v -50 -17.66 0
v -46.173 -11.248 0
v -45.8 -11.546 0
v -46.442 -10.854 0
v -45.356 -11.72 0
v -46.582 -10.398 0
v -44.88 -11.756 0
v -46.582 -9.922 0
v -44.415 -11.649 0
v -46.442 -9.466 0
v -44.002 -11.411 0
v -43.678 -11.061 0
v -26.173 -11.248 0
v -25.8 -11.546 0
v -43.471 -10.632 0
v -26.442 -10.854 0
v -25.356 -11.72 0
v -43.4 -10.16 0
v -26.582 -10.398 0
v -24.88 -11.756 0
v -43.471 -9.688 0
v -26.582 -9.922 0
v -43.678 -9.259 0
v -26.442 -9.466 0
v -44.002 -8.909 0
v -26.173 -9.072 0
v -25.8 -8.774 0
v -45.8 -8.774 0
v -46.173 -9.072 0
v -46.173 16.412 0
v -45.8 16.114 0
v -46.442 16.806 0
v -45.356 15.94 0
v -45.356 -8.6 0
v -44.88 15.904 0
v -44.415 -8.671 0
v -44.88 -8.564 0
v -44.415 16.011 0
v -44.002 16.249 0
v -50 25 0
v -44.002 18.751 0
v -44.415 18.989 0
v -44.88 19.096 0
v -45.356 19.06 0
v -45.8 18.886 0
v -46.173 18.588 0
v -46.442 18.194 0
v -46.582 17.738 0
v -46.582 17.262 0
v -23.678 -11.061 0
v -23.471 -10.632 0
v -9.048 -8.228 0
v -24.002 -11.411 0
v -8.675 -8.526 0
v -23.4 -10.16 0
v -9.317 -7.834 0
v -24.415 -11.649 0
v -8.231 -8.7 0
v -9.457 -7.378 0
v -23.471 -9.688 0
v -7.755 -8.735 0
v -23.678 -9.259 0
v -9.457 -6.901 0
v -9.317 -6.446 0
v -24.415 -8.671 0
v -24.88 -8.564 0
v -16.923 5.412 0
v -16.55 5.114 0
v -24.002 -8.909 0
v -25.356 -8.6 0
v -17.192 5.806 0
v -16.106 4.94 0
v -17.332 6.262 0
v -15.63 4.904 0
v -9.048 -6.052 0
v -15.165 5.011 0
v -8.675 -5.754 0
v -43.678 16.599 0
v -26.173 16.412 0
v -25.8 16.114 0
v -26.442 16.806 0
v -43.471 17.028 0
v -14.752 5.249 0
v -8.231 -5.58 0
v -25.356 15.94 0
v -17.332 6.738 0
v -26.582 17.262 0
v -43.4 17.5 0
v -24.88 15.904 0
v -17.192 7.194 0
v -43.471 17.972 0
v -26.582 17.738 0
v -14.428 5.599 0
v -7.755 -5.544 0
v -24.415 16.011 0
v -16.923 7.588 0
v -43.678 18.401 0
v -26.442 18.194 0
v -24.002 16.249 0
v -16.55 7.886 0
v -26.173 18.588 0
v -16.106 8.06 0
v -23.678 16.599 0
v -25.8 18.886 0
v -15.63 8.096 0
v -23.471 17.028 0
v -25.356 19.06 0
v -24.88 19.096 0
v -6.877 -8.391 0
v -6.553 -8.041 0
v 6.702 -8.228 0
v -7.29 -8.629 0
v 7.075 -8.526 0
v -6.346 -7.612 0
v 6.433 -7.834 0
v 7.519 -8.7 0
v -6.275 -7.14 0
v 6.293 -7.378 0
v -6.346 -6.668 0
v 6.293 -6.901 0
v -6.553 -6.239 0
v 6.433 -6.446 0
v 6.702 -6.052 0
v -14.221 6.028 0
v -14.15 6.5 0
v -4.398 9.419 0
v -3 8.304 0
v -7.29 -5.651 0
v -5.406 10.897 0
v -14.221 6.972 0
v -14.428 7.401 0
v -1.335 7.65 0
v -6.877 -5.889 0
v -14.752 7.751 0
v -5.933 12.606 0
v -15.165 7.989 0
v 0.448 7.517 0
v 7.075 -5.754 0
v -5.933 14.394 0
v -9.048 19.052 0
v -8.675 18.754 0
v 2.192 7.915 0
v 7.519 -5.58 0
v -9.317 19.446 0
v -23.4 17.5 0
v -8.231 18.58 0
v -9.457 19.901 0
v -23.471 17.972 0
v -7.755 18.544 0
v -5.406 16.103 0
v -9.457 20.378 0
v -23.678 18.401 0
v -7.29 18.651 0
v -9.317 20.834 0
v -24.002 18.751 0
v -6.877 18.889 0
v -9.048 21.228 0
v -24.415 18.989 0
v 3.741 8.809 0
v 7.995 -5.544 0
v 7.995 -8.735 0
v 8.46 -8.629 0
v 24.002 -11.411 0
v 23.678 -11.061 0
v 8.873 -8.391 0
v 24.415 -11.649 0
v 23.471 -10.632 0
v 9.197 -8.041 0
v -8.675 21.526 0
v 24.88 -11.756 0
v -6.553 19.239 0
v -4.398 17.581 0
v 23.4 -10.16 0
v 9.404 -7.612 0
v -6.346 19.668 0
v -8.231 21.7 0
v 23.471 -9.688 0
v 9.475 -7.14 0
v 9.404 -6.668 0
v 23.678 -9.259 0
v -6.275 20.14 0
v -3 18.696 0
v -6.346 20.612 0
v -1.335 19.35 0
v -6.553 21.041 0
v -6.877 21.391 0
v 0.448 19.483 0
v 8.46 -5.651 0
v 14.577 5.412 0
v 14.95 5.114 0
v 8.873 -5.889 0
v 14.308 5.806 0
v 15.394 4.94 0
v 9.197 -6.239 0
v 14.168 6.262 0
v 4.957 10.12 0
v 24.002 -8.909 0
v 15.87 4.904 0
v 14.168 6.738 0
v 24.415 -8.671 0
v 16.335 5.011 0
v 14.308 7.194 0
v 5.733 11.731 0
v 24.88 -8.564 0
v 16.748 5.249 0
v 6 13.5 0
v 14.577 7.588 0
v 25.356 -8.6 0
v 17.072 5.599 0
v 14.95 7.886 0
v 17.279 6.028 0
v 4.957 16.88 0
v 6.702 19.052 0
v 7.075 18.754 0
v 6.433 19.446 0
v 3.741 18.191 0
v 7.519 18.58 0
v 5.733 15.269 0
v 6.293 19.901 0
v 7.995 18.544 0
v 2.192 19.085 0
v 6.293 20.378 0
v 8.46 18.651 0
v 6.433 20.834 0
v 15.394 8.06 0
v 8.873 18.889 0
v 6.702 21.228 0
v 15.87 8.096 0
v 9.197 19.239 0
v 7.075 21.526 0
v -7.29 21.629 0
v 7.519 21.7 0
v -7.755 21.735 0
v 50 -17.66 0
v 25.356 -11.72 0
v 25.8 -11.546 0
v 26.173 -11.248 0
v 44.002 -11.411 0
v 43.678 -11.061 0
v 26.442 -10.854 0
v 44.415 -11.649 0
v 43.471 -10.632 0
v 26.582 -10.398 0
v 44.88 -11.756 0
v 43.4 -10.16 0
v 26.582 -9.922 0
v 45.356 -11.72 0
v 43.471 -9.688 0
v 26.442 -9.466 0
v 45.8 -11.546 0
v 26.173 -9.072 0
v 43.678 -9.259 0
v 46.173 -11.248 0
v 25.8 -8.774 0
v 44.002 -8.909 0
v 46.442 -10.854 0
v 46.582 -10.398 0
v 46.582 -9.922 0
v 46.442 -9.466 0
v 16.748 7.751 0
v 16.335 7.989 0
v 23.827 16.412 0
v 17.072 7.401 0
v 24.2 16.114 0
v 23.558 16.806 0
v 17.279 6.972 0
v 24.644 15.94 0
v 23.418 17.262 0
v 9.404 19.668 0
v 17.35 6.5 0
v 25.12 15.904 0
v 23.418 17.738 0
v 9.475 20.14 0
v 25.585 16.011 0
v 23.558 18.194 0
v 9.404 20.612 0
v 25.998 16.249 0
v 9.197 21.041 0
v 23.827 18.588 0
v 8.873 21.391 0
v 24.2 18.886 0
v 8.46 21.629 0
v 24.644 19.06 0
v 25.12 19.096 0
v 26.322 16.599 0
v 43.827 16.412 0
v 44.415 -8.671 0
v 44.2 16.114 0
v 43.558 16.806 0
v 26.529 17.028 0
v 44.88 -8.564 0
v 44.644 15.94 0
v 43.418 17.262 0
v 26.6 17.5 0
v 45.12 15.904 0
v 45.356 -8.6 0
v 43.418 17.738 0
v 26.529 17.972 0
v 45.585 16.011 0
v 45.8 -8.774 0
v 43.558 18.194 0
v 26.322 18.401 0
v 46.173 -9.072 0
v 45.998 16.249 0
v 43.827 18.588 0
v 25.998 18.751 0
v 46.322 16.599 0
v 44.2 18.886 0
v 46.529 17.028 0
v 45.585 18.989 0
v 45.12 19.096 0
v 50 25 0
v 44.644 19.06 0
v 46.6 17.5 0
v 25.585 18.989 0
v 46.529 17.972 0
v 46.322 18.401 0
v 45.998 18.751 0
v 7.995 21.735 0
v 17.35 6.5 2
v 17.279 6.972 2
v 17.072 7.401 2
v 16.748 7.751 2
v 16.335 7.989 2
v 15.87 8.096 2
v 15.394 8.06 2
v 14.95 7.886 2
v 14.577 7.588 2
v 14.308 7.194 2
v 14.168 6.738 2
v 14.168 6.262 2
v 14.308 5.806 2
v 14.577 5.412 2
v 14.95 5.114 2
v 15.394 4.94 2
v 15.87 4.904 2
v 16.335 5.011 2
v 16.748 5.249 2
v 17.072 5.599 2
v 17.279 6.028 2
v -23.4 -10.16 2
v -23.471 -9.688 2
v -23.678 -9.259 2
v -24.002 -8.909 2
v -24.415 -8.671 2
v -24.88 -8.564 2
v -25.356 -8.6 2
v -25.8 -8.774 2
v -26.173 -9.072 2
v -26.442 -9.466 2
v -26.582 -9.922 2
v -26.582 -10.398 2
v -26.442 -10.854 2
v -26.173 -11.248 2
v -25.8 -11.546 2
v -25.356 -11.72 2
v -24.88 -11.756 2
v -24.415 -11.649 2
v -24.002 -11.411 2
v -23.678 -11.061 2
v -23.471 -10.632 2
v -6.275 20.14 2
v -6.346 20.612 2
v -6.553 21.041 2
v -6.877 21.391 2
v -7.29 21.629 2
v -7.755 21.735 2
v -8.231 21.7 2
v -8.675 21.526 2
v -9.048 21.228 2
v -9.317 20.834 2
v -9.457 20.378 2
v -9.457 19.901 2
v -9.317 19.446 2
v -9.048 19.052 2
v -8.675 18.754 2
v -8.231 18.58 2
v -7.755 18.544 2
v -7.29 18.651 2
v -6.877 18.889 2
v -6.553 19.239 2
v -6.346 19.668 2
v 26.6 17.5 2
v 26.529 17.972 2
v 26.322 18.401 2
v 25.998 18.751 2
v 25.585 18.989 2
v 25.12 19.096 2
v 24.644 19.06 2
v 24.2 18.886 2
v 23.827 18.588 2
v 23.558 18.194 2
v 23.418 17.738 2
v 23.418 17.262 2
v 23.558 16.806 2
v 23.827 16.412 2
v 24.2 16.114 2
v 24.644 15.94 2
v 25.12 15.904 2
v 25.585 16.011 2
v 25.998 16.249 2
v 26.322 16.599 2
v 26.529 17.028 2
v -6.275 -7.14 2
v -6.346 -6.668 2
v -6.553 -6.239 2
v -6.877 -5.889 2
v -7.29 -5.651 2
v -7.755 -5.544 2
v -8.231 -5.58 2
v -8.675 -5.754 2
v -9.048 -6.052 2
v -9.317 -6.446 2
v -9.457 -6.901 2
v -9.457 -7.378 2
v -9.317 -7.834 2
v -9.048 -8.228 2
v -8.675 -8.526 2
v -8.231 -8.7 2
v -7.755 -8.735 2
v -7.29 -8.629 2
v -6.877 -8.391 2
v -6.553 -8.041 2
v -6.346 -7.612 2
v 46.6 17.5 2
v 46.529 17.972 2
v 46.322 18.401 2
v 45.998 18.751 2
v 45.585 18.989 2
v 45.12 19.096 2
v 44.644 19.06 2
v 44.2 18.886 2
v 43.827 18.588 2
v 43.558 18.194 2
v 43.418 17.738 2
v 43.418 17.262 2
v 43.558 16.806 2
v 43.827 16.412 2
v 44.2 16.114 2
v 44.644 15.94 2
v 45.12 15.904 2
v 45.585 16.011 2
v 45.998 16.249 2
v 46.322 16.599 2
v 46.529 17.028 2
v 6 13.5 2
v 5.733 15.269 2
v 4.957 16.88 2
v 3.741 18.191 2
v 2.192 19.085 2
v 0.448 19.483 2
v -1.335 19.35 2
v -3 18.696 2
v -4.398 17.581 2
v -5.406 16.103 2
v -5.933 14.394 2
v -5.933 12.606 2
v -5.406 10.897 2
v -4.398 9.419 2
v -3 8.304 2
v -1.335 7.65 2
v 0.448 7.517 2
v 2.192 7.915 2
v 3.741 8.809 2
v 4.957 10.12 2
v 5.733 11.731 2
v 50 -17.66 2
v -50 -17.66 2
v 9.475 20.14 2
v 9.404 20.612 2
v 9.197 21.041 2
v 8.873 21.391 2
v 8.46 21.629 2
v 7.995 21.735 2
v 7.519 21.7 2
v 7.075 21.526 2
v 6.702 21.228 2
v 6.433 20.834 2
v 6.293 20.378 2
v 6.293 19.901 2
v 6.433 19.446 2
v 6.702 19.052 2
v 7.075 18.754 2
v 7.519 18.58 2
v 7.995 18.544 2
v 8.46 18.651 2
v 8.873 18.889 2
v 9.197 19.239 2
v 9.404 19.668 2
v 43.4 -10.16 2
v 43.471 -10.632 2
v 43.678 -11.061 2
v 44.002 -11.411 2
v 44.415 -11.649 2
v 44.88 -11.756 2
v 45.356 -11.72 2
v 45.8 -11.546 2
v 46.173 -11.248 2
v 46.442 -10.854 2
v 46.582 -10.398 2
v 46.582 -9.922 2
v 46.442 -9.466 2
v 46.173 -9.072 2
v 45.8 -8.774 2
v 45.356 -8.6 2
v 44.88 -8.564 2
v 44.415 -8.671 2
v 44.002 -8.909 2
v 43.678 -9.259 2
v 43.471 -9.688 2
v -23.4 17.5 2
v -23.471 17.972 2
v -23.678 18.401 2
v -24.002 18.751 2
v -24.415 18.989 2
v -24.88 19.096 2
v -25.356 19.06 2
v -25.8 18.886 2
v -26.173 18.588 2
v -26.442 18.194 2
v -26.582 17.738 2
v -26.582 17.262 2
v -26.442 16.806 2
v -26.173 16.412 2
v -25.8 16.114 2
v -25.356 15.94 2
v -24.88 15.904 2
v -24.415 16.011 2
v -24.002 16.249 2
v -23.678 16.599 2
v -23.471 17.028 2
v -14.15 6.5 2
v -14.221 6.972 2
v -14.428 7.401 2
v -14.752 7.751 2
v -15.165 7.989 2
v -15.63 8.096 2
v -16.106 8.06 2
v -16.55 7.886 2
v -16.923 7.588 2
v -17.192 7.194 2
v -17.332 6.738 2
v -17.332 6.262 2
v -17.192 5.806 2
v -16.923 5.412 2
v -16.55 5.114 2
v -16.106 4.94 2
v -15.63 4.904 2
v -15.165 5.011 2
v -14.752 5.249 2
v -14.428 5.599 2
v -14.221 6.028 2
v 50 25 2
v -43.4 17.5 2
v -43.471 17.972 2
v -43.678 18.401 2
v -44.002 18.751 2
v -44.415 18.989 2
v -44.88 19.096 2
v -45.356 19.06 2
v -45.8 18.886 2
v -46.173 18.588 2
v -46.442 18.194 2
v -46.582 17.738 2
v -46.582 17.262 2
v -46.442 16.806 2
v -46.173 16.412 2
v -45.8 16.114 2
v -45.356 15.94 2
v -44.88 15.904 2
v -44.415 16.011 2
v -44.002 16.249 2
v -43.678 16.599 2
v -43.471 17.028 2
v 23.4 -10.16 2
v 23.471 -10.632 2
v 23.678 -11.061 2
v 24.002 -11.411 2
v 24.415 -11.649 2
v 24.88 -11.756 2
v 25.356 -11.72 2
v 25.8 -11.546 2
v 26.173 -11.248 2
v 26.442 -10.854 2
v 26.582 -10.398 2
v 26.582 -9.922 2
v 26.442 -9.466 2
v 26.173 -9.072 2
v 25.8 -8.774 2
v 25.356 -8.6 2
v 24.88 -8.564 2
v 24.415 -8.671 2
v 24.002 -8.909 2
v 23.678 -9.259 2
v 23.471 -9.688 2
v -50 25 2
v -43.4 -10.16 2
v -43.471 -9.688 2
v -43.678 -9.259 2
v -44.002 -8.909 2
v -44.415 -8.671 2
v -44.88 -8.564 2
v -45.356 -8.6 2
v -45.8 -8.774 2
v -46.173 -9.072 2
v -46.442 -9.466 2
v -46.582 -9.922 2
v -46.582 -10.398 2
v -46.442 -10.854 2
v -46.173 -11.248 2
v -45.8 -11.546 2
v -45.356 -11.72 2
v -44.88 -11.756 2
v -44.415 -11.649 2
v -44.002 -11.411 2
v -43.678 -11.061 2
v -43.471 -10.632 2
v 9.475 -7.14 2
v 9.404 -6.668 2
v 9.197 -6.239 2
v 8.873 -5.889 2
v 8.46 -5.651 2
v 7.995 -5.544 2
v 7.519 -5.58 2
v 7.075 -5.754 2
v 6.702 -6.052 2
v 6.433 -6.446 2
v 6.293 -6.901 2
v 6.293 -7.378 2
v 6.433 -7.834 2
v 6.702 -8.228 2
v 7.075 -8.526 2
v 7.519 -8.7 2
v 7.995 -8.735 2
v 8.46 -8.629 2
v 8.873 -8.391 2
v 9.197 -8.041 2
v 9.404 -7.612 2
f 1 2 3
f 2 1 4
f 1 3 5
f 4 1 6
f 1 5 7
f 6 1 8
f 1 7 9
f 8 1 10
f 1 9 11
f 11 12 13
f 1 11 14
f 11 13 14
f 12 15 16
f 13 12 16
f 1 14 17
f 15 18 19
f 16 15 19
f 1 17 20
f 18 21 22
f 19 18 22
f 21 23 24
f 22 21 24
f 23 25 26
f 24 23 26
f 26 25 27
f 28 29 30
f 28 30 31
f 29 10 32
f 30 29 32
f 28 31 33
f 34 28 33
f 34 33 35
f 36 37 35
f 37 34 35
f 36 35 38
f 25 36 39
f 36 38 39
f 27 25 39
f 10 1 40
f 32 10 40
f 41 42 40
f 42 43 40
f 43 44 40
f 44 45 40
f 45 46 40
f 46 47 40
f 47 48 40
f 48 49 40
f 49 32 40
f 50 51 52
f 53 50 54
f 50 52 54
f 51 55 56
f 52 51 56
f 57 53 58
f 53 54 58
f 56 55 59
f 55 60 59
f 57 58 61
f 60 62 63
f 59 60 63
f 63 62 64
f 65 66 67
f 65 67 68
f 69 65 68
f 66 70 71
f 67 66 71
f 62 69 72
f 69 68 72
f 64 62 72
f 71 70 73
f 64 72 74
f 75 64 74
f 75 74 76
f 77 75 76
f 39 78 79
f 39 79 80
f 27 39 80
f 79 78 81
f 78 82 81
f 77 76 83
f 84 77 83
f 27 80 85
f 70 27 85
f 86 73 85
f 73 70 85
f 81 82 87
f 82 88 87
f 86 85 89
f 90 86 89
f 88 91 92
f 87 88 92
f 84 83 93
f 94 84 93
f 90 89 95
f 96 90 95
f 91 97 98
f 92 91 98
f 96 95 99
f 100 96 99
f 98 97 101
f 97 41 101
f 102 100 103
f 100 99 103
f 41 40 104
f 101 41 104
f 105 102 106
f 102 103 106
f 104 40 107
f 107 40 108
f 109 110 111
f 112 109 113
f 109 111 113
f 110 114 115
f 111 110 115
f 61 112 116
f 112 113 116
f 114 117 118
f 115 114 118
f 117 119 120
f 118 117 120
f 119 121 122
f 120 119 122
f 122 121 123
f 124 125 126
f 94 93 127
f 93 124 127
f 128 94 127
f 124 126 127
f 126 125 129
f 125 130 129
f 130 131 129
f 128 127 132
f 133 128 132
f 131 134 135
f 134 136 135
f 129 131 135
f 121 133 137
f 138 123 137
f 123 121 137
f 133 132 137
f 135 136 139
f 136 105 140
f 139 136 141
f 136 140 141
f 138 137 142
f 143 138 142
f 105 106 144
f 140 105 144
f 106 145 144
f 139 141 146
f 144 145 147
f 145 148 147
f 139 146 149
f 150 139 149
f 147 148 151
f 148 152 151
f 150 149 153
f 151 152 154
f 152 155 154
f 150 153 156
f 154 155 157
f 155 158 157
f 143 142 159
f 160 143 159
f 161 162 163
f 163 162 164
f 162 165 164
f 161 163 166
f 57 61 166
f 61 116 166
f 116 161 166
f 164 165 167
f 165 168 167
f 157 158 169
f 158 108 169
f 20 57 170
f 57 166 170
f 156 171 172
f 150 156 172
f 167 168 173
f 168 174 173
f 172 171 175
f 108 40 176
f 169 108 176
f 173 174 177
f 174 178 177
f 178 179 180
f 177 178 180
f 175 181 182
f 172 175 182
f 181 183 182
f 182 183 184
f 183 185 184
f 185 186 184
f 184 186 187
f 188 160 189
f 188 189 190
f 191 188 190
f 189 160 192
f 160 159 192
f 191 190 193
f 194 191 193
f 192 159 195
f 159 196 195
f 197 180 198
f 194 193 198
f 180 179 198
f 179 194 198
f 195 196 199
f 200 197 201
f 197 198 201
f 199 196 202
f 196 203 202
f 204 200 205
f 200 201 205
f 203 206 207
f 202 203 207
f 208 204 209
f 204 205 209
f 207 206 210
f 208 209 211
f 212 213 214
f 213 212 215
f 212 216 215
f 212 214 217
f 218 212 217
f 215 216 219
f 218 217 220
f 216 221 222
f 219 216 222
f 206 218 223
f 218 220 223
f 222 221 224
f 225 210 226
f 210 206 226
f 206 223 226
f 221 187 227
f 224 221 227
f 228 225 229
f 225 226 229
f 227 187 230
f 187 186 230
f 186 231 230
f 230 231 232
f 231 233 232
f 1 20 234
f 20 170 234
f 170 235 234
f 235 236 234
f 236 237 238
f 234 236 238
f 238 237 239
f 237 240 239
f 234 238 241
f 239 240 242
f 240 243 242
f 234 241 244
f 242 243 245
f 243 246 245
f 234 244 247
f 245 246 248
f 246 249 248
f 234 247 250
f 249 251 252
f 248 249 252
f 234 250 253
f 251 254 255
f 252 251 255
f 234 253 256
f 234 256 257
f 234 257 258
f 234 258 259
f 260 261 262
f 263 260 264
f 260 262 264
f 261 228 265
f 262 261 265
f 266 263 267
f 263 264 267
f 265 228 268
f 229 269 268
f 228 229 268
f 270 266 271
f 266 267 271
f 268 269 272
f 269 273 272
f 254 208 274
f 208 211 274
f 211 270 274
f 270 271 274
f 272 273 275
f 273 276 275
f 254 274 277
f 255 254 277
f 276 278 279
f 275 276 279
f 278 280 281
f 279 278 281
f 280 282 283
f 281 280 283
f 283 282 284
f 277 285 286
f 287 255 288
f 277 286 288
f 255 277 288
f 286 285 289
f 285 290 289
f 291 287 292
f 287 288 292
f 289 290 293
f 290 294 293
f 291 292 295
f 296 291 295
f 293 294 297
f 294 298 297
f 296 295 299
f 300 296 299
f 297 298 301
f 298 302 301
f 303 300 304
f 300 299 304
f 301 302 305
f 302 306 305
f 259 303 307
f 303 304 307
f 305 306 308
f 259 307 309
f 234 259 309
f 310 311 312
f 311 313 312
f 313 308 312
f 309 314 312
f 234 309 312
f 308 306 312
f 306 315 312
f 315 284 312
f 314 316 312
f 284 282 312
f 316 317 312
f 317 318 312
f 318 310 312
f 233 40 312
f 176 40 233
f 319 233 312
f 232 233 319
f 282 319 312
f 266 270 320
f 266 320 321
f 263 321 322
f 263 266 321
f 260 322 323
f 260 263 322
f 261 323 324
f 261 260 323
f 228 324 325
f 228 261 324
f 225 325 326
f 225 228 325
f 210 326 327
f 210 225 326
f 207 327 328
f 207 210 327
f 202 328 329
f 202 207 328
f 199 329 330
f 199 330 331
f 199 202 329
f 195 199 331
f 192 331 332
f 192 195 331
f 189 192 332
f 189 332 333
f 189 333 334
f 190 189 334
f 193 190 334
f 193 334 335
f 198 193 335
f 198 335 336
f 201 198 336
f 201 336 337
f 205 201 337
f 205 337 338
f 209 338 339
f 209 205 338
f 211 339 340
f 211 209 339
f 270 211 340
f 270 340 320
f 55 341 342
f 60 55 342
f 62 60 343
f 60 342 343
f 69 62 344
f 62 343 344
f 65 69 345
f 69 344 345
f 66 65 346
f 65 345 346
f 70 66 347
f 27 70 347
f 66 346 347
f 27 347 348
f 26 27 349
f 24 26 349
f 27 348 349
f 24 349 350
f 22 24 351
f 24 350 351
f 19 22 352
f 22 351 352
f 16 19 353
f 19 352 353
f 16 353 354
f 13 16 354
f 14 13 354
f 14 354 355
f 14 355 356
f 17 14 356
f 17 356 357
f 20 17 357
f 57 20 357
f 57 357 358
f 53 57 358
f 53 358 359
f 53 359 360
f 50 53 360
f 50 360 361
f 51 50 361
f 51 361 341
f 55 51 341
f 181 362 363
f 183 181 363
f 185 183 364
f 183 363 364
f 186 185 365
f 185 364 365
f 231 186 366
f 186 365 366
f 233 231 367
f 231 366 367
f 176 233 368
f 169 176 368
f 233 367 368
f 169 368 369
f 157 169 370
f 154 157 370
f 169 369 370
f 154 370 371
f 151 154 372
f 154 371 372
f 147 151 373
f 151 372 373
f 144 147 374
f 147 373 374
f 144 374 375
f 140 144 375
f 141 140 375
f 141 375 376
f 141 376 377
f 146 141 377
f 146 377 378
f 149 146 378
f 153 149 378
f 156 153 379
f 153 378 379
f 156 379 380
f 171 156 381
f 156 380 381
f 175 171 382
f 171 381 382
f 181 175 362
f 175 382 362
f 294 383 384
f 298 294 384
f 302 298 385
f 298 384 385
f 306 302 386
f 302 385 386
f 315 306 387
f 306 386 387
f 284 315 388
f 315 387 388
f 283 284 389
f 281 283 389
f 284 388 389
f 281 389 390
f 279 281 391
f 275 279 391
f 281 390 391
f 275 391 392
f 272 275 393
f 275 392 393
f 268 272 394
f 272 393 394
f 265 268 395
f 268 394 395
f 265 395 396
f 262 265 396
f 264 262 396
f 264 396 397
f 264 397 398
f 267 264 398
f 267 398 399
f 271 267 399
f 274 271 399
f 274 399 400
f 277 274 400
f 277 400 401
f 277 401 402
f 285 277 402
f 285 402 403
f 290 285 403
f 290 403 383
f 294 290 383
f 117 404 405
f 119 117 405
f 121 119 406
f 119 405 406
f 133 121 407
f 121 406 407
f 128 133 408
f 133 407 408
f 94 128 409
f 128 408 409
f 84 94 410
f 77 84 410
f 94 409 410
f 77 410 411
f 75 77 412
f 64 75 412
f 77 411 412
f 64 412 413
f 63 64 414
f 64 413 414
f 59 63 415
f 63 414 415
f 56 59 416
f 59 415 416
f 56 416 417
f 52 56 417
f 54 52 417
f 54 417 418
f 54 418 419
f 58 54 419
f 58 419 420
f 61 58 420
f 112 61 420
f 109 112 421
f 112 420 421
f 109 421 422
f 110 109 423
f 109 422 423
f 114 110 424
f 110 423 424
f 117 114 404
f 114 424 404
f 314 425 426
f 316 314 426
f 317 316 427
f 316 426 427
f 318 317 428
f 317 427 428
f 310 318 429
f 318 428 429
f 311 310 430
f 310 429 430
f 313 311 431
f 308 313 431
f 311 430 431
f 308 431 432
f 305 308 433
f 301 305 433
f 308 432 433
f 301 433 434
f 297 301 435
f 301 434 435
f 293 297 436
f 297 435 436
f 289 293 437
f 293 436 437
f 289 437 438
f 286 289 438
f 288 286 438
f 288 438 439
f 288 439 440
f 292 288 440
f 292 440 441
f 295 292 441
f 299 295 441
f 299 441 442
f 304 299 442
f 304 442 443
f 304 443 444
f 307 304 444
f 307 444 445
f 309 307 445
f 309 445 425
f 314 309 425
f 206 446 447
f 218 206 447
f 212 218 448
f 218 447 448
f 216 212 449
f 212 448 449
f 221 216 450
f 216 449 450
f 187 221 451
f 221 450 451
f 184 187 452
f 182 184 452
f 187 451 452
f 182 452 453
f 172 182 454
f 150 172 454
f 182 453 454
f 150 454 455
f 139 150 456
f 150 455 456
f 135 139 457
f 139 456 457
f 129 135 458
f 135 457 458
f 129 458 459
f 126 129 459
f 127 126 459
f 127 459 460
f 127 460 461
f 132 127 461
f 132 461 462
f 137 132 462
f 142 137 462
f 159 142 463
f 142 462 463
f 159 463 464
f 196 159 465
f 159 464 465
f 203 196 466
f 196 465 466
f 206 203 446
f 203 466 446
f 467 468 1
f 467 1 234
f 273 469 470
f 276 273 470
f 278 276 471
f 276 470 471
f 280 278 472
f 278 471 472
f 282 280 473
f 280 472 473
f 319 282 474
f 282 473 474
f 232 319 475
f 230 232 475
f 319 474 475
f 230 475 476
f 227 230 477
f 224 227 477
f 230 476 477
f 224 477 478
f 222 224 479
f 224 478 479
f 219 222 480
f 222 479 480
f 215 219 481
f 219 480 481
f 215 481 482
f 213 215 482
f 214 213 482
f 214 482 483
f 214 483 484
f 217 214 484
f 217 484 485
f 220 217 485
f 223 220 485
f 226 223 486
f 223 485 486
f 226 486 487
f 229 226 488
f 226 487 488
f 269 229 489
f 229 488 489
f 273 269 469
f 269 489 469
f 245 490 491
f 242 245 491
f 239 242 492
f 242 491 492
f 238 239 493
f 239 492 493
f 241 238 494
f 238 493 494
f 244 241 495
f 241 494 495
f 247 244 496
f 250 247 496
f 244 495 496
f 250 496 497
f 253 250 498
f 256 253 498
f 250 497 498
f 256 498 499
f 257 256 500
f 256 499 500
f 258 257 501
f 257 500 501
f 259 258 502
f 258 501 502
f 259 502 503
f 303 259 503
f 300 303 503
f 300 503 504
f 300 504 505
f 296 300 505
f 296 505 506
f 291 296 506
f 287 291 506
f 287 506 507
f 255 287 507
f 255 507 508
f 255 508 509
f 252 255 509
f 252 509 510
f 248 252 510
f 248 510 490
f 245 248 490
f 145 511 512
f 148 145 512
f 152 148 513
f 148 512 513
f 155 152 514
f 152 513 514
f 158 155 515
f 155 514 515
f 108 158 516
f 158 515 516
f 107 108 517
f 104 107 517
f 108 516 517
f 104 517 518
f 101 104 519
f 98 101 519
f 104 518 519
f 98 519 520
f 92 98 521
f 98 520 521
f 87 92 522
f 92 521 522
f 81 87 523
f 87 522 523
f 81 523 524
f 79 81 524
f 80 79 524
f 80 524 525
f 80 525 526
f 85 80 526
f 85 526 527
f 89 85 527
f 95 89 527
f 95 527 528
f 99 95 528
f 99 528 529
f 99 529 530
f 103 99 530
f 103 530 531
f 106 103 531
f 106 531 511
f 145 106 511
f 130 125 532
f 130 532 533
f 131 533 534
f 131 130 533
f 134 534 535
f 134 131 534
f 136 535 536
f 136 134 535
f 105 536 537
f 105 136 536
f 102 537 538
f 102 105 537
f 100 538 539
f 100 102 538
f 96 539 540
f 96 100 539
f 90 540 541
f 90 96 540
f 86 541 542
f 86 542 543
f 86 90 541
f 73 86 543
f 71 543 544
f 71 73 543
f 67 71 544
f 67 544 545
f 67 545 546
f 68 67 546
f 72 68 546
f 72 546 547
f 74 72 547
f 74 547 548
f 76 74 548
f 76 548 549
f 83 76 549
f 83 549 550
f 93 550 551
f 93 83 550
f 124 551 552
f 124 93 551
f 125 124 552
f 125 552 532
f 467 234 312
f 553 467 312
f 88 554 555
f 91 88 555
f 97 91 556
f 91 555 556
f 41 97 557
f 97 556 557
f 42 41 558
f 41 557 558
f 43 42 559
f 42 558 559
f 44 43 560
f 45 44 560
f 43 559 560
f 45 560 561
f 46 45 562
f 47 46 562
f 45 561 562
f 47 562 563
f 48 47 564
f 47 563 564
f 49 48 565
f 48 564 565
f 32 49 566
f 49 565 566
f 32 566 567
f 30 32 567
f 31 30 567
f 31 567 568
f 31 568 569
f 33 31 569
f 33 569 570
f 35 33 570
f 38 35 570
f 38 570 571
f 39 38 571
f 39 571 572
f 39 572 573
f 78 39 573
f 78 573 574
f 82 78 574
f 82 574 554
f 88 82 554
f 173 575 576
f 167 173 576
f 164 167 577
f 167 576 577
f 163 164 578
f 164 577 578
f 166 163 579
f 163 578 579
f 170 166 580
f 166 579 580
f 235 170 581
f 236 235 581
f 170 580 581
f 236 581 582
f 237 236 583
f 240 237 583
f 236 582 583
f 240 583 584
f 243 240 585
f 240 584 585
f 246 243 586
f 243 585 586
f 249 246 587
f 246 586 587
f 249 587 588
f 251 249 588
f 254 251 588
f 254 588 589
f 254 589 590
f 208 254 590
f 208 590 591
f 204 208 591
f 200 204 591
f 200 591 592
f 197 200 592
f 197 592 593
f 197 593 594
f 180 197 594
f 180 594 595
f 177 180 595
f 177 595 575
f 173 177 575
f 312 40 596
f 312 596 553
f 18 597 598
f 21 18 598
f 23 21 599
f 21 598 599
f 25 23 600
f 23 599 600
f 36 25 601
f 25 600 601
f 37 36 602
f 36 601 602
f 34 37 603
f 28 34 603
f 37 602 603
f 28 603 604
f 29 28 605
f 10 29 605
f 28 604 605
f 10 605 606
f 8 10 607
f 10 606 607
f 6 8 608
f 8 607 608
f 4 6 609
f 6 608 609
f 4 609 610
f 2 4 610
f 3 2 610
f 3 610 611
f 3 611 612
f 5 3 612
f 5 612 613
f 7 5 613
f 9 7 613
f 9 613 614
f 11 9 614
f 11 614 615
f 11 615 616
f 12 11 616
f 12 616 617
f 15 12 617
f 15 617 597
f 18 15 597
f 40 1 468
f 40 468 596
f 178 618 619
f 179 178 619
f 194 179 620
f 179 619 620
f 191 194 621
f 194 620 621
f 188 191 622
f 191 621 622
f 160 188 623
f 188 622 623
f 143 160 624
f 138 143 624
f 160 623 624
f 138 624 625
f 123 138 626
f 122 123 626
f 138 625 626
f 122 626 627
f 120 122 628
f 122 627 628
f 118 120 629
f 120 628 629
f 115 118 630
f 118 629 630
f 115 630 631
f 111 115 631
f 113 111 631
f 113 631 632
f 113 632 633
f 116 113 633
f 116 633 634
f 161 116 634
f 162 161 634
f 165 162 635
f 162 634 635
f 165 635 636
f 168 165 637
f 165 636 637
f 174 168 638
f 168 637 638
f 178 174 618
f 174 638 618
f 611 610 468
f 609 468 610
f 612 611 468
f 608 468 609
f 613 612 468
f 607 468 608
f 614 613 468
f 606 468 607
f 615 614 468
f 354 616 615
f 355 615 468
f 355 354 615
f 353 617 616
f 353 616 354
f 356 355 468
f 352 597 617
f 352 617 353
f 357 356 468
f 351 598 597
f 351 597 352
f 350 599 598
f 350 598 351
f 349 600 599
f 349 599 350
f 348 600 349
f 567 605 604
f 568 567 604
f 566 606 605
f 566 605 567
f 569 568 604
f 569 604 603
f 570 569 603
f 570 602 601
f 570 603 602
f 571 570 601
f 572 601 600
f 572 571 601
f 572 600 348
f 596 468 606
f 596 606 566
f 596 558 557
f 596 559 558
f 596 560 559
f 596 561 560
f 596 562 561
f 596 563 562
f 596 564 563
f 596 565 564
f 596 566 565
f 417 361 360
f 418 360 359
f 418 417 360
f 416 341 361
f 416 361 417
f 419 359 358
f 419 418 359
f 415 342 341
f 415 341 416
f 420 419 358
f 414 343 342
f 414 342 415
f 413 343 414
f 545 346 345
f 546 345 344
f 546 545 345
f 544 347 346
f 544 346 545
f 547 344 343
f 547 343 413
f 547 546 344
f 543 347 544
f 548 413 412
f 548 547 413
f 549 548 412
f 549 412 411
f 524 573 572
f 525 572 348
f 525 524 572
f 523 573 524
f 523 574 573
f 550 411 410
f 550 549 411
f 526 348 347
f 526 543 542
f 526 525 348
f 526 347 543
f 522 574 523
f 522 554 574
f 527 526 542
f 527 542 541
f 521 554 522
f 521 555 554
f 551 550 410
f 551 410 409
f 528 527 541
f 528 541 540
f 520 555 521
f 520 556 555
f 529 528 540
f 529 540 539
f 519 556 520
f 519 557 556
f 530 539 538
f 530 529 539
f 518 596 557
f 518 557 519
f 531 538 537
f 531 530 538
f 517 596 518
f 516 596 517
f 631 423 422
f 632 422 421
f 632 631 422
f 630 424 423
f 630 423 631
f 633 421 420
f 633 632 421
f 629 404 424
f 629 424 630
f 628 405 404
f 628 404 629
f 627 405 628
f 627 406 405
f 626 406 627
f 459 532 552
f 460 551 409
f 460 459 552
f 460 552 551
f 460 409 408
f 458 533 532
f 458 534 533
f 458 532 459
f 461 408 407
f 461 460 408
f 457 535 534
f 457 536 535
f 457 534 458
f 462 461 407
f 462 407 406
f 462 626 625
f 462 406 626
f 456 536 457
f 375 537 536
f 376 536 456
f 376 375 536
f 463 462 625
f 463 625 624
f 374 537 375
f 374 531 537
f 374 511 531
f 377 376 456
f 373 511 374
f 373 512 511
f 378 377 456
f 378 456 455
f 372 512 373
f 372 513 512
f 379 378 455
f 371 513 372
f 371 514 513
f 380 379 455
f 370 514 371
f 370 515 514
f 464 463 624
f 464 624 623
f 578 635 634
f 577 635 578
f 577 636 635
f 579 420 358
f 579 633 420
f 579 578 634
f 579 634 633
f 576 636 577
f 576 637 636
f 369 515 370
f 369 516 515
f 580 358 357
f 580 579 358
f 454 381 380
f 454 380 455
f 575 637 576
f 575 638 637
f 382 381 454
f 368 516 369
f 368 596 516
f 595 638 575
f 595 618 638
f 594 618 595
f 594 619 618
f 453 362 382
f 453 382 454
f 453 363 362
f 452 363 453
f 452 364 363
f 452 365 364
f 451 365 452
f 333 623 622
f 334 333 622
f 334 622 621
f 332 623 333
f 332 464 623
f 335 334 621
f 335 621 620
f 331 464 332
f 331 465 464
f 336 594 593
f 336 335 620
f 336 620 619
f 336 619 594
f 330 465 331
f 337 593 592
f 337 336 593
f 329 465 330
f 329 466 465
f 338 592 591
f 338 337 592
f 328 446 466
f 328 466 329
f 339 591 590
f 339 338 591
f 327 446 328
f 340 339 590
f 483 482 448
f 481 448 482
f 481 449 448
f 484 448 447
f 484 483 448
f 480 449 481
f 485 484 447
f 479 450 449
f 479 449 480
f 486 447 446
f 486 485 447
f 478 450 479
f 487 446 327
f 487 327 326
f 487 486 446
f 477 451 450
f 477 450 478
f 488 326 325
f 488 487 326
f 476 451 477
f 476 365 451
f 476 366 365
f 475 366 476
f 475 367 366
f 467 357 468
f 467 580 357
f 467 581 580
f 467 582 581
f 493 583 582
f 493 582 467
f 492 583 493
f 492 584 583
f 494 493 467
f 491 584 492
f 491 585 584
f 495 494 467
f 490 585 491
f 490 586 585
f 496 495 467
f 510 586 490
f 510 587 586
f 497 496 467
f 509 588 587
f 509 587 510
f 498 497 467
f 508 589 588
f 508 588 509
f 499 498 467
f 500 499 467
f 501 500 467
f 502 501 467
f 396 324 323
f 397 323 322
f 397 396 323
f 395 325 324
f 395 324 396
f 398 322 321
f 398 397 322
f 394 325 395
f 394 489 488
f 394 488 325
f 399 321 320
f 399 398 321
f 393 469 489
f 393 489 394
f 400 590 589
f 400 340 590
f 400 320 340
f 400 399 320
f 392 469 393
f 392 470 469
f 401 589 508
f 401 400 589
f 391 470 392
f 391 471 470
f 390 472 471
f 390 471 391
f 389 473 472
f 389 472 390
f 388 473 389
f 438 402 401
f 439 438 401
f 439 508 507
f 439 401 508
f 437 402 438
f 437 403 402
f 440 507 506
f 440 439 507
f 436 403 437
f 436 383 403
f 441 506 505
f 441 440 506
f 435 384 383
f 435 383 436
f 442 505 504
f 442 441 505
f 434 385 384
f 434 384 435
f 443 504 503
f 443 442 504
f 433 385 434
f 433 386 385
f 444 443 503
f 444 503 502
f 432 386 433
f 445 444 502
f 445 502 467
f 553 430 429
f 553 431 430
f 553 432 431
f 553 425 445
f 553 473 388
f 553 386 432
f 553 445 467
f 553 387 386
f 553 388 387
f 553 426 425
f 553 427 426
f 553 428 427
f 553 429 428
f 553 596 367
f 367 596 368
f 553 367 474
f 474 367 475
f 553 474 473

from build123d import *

# Parameters (mm, degrees)
SKETCH_1_W          = 100
SKETCH_1_H          = 50
SKETCH_1_R          = 1.6
EXTRUDE_1_DEPTH     = 2
SKETCH_3_R          = 6
CUT_EXTRUDE_2_DEPTH = 2
SKETCH_4_R          = 1.6
CUT_EXTRUDE_3_DEPTH = 2
CUT_EXTRUDE_7_DEPTH = 3
SKETCH_6_W          = 100
SKETCH_6_H          = 2
CUT_EXTRUDE_8_DEPTH = 7.34
SKETCH_7_R          = 1.6
CUT_EXTRUDE_9_DEPTH = 10


with BuildPart() as part:
    # ｽｹｯﾁ1 → ﾎﾞｽ - 押し出し1 (new body)
    with BuildSketch(Plane.XY):
        Rectangle(SKETCH_1_W, SKETCH_1_H)
        with Locations((-15.75, 6.5)):
            Circle(SKETCH_1_R, mode=Mode.SUBTRACT)
        with Locations((15.75, 6.5)):
            Circle(SKETCH_1_R, mode=Mode.SUBTRACT)
    extrude(amount=EXTRUDE_1_DEPTH)

    # ｽｹｯﾁ3 → ｶｯﾄ - 押し出し2 (cut)
    with BuildSketch(Plane.XY.offset(2)):
        with Locations((0, 13.5)):
            Circle(SKETCH_3_R)
    extrude(amount=-CUT_EXTRUDE_2_DEPTH, mode=Mode.SUBTRACT)

    # ｽｹｯﾁ4 → ｶｯﾄ - 押し出し3 (cut)
    with BuildSketch(Plane.XY.offset(2)):
        with Locations((-7.875, 20.13990011)):
            Circle(SKETCH_4_R)
        with Locations((7.875, 20.13990011)):
            Circle(SKETCH_4_R)
        with Locations((-7.875, -7.13990011)):
            Circle(SKETCH_4_R)
        with Locations((7.875, -7.13990011)):
            Circle(SKETCH_4_R)
    extrude(amount=-CUT_EXTRUDE_3_DEPTH, mode=Mode.SUBTRACT)

    # ｽｹｯﾁ5 → ｶｯﾄ - 押し出し7 (cut, through all)
    with BuildSketch(Plane.XY.offset(2)):
        with BuildLine():
            ThreePointArc((-46.6, -10.16), (-45, -11.76), (-43.4, -10.16))
            Line((-43.4, -10.16), (-45, -10.16))
            Line((-45, -10.16), (-46.6, -10.16))
        make_face()
        with BuildLine():
            Line((-45, -10.16), (-43.4, -10.16))
            ThreePointArc((-43.4, -10.16), (-45, -8.56), (-46.6, -10.16))
            Line((-46.6, -10.16), (-45, -10.16))
        make_face()
        with BuildLine():
            ThreePointArc((-26.6, -10.16), (-25, -11.76), (-23.4, -10.16))
            Line((-23.4, -10.16), (-25, -10.16))
            Line((-25, -10.16), (-26.6, -10.16))
        make_face()
        with BuildLine():
            Line((-25, -10.16), (-23.4, -10.16))
            ThreePointArc((-23.4, -10.16), (-25, -8.56), (-26.6, -10.16))
            Line((-26.6, -10.16), (-25, -10.16))
        make_face()
        with BuildLine():
            ThreePointArc((46.6, -10.16), (45, -8.56), (43.4, -10.16))
            Line((43.4, -10.16), (45, -10.16))
            Line((45, -10.16), (46.6, -10.16))
        make_face()
        with BuildLine():
            Line((45, -10.16), (43.4, -10.16))
            ThreePointArc((43.4, -10.16), (45, -11.76), (46.6, -10.16))
            Line((46.6, -10.16), (45, -10.16))
        make_face()
        with BuildLine():
            ThreePointArc((26.6, -10.16), (25, -8.56), (23.4, -10.16))
            Line((23.4, -10.16), (25, -10.16))
            Line((25, -10.16), (26.6, -10.16))
        make_face()
        with BuildLine():
            Line((25, -10.16), (23.4, -10.16))
            ThreePointArc((23.4, -10.16), (25, -11.76), (26.6, -10.16))
            Line((26.6, -10.16), (25, -10.16))
        make_face()
    extrude(amount=-CUT_EXTRUDE_7_DEPTH, mode=Mode.SUBTRACT)

    # ｽｹｯﾁ6 → ｶｯﾄ - 押し出し8 (cut)
    with BuildSketch(Plane.XZ.offset(25)):
        with Locations((0, 1)):
            Rectangle(SKETCH_6_W, SKETCH_6_H)
    extrude(amount=-CUT_EXTRUDE_8_DEPTH, mode=Mode.SUBTRACT)

    # ｽｹｯﾁ7 → ｶｯﾄ - 押し出し9 (cut)
    with BuildSketch(Plane.XY.offset(2)):
        with Locations((-45, 17.5)):
            Circle(SKETCH_7_R)
        with Locations((-25, 17.5)):
            Circle(SKETCH_7_R)
        with Locations((45, 17.5)):
            Circle(SKETCH_7_R)
        with Locations((25, 17.5)):
            Circle(SKETCH_7_R)
    extrude(amount=-CUT_EXTRUDE_9_DEPTH, mode=Mode.SUBTRACT)


solid = part.part
